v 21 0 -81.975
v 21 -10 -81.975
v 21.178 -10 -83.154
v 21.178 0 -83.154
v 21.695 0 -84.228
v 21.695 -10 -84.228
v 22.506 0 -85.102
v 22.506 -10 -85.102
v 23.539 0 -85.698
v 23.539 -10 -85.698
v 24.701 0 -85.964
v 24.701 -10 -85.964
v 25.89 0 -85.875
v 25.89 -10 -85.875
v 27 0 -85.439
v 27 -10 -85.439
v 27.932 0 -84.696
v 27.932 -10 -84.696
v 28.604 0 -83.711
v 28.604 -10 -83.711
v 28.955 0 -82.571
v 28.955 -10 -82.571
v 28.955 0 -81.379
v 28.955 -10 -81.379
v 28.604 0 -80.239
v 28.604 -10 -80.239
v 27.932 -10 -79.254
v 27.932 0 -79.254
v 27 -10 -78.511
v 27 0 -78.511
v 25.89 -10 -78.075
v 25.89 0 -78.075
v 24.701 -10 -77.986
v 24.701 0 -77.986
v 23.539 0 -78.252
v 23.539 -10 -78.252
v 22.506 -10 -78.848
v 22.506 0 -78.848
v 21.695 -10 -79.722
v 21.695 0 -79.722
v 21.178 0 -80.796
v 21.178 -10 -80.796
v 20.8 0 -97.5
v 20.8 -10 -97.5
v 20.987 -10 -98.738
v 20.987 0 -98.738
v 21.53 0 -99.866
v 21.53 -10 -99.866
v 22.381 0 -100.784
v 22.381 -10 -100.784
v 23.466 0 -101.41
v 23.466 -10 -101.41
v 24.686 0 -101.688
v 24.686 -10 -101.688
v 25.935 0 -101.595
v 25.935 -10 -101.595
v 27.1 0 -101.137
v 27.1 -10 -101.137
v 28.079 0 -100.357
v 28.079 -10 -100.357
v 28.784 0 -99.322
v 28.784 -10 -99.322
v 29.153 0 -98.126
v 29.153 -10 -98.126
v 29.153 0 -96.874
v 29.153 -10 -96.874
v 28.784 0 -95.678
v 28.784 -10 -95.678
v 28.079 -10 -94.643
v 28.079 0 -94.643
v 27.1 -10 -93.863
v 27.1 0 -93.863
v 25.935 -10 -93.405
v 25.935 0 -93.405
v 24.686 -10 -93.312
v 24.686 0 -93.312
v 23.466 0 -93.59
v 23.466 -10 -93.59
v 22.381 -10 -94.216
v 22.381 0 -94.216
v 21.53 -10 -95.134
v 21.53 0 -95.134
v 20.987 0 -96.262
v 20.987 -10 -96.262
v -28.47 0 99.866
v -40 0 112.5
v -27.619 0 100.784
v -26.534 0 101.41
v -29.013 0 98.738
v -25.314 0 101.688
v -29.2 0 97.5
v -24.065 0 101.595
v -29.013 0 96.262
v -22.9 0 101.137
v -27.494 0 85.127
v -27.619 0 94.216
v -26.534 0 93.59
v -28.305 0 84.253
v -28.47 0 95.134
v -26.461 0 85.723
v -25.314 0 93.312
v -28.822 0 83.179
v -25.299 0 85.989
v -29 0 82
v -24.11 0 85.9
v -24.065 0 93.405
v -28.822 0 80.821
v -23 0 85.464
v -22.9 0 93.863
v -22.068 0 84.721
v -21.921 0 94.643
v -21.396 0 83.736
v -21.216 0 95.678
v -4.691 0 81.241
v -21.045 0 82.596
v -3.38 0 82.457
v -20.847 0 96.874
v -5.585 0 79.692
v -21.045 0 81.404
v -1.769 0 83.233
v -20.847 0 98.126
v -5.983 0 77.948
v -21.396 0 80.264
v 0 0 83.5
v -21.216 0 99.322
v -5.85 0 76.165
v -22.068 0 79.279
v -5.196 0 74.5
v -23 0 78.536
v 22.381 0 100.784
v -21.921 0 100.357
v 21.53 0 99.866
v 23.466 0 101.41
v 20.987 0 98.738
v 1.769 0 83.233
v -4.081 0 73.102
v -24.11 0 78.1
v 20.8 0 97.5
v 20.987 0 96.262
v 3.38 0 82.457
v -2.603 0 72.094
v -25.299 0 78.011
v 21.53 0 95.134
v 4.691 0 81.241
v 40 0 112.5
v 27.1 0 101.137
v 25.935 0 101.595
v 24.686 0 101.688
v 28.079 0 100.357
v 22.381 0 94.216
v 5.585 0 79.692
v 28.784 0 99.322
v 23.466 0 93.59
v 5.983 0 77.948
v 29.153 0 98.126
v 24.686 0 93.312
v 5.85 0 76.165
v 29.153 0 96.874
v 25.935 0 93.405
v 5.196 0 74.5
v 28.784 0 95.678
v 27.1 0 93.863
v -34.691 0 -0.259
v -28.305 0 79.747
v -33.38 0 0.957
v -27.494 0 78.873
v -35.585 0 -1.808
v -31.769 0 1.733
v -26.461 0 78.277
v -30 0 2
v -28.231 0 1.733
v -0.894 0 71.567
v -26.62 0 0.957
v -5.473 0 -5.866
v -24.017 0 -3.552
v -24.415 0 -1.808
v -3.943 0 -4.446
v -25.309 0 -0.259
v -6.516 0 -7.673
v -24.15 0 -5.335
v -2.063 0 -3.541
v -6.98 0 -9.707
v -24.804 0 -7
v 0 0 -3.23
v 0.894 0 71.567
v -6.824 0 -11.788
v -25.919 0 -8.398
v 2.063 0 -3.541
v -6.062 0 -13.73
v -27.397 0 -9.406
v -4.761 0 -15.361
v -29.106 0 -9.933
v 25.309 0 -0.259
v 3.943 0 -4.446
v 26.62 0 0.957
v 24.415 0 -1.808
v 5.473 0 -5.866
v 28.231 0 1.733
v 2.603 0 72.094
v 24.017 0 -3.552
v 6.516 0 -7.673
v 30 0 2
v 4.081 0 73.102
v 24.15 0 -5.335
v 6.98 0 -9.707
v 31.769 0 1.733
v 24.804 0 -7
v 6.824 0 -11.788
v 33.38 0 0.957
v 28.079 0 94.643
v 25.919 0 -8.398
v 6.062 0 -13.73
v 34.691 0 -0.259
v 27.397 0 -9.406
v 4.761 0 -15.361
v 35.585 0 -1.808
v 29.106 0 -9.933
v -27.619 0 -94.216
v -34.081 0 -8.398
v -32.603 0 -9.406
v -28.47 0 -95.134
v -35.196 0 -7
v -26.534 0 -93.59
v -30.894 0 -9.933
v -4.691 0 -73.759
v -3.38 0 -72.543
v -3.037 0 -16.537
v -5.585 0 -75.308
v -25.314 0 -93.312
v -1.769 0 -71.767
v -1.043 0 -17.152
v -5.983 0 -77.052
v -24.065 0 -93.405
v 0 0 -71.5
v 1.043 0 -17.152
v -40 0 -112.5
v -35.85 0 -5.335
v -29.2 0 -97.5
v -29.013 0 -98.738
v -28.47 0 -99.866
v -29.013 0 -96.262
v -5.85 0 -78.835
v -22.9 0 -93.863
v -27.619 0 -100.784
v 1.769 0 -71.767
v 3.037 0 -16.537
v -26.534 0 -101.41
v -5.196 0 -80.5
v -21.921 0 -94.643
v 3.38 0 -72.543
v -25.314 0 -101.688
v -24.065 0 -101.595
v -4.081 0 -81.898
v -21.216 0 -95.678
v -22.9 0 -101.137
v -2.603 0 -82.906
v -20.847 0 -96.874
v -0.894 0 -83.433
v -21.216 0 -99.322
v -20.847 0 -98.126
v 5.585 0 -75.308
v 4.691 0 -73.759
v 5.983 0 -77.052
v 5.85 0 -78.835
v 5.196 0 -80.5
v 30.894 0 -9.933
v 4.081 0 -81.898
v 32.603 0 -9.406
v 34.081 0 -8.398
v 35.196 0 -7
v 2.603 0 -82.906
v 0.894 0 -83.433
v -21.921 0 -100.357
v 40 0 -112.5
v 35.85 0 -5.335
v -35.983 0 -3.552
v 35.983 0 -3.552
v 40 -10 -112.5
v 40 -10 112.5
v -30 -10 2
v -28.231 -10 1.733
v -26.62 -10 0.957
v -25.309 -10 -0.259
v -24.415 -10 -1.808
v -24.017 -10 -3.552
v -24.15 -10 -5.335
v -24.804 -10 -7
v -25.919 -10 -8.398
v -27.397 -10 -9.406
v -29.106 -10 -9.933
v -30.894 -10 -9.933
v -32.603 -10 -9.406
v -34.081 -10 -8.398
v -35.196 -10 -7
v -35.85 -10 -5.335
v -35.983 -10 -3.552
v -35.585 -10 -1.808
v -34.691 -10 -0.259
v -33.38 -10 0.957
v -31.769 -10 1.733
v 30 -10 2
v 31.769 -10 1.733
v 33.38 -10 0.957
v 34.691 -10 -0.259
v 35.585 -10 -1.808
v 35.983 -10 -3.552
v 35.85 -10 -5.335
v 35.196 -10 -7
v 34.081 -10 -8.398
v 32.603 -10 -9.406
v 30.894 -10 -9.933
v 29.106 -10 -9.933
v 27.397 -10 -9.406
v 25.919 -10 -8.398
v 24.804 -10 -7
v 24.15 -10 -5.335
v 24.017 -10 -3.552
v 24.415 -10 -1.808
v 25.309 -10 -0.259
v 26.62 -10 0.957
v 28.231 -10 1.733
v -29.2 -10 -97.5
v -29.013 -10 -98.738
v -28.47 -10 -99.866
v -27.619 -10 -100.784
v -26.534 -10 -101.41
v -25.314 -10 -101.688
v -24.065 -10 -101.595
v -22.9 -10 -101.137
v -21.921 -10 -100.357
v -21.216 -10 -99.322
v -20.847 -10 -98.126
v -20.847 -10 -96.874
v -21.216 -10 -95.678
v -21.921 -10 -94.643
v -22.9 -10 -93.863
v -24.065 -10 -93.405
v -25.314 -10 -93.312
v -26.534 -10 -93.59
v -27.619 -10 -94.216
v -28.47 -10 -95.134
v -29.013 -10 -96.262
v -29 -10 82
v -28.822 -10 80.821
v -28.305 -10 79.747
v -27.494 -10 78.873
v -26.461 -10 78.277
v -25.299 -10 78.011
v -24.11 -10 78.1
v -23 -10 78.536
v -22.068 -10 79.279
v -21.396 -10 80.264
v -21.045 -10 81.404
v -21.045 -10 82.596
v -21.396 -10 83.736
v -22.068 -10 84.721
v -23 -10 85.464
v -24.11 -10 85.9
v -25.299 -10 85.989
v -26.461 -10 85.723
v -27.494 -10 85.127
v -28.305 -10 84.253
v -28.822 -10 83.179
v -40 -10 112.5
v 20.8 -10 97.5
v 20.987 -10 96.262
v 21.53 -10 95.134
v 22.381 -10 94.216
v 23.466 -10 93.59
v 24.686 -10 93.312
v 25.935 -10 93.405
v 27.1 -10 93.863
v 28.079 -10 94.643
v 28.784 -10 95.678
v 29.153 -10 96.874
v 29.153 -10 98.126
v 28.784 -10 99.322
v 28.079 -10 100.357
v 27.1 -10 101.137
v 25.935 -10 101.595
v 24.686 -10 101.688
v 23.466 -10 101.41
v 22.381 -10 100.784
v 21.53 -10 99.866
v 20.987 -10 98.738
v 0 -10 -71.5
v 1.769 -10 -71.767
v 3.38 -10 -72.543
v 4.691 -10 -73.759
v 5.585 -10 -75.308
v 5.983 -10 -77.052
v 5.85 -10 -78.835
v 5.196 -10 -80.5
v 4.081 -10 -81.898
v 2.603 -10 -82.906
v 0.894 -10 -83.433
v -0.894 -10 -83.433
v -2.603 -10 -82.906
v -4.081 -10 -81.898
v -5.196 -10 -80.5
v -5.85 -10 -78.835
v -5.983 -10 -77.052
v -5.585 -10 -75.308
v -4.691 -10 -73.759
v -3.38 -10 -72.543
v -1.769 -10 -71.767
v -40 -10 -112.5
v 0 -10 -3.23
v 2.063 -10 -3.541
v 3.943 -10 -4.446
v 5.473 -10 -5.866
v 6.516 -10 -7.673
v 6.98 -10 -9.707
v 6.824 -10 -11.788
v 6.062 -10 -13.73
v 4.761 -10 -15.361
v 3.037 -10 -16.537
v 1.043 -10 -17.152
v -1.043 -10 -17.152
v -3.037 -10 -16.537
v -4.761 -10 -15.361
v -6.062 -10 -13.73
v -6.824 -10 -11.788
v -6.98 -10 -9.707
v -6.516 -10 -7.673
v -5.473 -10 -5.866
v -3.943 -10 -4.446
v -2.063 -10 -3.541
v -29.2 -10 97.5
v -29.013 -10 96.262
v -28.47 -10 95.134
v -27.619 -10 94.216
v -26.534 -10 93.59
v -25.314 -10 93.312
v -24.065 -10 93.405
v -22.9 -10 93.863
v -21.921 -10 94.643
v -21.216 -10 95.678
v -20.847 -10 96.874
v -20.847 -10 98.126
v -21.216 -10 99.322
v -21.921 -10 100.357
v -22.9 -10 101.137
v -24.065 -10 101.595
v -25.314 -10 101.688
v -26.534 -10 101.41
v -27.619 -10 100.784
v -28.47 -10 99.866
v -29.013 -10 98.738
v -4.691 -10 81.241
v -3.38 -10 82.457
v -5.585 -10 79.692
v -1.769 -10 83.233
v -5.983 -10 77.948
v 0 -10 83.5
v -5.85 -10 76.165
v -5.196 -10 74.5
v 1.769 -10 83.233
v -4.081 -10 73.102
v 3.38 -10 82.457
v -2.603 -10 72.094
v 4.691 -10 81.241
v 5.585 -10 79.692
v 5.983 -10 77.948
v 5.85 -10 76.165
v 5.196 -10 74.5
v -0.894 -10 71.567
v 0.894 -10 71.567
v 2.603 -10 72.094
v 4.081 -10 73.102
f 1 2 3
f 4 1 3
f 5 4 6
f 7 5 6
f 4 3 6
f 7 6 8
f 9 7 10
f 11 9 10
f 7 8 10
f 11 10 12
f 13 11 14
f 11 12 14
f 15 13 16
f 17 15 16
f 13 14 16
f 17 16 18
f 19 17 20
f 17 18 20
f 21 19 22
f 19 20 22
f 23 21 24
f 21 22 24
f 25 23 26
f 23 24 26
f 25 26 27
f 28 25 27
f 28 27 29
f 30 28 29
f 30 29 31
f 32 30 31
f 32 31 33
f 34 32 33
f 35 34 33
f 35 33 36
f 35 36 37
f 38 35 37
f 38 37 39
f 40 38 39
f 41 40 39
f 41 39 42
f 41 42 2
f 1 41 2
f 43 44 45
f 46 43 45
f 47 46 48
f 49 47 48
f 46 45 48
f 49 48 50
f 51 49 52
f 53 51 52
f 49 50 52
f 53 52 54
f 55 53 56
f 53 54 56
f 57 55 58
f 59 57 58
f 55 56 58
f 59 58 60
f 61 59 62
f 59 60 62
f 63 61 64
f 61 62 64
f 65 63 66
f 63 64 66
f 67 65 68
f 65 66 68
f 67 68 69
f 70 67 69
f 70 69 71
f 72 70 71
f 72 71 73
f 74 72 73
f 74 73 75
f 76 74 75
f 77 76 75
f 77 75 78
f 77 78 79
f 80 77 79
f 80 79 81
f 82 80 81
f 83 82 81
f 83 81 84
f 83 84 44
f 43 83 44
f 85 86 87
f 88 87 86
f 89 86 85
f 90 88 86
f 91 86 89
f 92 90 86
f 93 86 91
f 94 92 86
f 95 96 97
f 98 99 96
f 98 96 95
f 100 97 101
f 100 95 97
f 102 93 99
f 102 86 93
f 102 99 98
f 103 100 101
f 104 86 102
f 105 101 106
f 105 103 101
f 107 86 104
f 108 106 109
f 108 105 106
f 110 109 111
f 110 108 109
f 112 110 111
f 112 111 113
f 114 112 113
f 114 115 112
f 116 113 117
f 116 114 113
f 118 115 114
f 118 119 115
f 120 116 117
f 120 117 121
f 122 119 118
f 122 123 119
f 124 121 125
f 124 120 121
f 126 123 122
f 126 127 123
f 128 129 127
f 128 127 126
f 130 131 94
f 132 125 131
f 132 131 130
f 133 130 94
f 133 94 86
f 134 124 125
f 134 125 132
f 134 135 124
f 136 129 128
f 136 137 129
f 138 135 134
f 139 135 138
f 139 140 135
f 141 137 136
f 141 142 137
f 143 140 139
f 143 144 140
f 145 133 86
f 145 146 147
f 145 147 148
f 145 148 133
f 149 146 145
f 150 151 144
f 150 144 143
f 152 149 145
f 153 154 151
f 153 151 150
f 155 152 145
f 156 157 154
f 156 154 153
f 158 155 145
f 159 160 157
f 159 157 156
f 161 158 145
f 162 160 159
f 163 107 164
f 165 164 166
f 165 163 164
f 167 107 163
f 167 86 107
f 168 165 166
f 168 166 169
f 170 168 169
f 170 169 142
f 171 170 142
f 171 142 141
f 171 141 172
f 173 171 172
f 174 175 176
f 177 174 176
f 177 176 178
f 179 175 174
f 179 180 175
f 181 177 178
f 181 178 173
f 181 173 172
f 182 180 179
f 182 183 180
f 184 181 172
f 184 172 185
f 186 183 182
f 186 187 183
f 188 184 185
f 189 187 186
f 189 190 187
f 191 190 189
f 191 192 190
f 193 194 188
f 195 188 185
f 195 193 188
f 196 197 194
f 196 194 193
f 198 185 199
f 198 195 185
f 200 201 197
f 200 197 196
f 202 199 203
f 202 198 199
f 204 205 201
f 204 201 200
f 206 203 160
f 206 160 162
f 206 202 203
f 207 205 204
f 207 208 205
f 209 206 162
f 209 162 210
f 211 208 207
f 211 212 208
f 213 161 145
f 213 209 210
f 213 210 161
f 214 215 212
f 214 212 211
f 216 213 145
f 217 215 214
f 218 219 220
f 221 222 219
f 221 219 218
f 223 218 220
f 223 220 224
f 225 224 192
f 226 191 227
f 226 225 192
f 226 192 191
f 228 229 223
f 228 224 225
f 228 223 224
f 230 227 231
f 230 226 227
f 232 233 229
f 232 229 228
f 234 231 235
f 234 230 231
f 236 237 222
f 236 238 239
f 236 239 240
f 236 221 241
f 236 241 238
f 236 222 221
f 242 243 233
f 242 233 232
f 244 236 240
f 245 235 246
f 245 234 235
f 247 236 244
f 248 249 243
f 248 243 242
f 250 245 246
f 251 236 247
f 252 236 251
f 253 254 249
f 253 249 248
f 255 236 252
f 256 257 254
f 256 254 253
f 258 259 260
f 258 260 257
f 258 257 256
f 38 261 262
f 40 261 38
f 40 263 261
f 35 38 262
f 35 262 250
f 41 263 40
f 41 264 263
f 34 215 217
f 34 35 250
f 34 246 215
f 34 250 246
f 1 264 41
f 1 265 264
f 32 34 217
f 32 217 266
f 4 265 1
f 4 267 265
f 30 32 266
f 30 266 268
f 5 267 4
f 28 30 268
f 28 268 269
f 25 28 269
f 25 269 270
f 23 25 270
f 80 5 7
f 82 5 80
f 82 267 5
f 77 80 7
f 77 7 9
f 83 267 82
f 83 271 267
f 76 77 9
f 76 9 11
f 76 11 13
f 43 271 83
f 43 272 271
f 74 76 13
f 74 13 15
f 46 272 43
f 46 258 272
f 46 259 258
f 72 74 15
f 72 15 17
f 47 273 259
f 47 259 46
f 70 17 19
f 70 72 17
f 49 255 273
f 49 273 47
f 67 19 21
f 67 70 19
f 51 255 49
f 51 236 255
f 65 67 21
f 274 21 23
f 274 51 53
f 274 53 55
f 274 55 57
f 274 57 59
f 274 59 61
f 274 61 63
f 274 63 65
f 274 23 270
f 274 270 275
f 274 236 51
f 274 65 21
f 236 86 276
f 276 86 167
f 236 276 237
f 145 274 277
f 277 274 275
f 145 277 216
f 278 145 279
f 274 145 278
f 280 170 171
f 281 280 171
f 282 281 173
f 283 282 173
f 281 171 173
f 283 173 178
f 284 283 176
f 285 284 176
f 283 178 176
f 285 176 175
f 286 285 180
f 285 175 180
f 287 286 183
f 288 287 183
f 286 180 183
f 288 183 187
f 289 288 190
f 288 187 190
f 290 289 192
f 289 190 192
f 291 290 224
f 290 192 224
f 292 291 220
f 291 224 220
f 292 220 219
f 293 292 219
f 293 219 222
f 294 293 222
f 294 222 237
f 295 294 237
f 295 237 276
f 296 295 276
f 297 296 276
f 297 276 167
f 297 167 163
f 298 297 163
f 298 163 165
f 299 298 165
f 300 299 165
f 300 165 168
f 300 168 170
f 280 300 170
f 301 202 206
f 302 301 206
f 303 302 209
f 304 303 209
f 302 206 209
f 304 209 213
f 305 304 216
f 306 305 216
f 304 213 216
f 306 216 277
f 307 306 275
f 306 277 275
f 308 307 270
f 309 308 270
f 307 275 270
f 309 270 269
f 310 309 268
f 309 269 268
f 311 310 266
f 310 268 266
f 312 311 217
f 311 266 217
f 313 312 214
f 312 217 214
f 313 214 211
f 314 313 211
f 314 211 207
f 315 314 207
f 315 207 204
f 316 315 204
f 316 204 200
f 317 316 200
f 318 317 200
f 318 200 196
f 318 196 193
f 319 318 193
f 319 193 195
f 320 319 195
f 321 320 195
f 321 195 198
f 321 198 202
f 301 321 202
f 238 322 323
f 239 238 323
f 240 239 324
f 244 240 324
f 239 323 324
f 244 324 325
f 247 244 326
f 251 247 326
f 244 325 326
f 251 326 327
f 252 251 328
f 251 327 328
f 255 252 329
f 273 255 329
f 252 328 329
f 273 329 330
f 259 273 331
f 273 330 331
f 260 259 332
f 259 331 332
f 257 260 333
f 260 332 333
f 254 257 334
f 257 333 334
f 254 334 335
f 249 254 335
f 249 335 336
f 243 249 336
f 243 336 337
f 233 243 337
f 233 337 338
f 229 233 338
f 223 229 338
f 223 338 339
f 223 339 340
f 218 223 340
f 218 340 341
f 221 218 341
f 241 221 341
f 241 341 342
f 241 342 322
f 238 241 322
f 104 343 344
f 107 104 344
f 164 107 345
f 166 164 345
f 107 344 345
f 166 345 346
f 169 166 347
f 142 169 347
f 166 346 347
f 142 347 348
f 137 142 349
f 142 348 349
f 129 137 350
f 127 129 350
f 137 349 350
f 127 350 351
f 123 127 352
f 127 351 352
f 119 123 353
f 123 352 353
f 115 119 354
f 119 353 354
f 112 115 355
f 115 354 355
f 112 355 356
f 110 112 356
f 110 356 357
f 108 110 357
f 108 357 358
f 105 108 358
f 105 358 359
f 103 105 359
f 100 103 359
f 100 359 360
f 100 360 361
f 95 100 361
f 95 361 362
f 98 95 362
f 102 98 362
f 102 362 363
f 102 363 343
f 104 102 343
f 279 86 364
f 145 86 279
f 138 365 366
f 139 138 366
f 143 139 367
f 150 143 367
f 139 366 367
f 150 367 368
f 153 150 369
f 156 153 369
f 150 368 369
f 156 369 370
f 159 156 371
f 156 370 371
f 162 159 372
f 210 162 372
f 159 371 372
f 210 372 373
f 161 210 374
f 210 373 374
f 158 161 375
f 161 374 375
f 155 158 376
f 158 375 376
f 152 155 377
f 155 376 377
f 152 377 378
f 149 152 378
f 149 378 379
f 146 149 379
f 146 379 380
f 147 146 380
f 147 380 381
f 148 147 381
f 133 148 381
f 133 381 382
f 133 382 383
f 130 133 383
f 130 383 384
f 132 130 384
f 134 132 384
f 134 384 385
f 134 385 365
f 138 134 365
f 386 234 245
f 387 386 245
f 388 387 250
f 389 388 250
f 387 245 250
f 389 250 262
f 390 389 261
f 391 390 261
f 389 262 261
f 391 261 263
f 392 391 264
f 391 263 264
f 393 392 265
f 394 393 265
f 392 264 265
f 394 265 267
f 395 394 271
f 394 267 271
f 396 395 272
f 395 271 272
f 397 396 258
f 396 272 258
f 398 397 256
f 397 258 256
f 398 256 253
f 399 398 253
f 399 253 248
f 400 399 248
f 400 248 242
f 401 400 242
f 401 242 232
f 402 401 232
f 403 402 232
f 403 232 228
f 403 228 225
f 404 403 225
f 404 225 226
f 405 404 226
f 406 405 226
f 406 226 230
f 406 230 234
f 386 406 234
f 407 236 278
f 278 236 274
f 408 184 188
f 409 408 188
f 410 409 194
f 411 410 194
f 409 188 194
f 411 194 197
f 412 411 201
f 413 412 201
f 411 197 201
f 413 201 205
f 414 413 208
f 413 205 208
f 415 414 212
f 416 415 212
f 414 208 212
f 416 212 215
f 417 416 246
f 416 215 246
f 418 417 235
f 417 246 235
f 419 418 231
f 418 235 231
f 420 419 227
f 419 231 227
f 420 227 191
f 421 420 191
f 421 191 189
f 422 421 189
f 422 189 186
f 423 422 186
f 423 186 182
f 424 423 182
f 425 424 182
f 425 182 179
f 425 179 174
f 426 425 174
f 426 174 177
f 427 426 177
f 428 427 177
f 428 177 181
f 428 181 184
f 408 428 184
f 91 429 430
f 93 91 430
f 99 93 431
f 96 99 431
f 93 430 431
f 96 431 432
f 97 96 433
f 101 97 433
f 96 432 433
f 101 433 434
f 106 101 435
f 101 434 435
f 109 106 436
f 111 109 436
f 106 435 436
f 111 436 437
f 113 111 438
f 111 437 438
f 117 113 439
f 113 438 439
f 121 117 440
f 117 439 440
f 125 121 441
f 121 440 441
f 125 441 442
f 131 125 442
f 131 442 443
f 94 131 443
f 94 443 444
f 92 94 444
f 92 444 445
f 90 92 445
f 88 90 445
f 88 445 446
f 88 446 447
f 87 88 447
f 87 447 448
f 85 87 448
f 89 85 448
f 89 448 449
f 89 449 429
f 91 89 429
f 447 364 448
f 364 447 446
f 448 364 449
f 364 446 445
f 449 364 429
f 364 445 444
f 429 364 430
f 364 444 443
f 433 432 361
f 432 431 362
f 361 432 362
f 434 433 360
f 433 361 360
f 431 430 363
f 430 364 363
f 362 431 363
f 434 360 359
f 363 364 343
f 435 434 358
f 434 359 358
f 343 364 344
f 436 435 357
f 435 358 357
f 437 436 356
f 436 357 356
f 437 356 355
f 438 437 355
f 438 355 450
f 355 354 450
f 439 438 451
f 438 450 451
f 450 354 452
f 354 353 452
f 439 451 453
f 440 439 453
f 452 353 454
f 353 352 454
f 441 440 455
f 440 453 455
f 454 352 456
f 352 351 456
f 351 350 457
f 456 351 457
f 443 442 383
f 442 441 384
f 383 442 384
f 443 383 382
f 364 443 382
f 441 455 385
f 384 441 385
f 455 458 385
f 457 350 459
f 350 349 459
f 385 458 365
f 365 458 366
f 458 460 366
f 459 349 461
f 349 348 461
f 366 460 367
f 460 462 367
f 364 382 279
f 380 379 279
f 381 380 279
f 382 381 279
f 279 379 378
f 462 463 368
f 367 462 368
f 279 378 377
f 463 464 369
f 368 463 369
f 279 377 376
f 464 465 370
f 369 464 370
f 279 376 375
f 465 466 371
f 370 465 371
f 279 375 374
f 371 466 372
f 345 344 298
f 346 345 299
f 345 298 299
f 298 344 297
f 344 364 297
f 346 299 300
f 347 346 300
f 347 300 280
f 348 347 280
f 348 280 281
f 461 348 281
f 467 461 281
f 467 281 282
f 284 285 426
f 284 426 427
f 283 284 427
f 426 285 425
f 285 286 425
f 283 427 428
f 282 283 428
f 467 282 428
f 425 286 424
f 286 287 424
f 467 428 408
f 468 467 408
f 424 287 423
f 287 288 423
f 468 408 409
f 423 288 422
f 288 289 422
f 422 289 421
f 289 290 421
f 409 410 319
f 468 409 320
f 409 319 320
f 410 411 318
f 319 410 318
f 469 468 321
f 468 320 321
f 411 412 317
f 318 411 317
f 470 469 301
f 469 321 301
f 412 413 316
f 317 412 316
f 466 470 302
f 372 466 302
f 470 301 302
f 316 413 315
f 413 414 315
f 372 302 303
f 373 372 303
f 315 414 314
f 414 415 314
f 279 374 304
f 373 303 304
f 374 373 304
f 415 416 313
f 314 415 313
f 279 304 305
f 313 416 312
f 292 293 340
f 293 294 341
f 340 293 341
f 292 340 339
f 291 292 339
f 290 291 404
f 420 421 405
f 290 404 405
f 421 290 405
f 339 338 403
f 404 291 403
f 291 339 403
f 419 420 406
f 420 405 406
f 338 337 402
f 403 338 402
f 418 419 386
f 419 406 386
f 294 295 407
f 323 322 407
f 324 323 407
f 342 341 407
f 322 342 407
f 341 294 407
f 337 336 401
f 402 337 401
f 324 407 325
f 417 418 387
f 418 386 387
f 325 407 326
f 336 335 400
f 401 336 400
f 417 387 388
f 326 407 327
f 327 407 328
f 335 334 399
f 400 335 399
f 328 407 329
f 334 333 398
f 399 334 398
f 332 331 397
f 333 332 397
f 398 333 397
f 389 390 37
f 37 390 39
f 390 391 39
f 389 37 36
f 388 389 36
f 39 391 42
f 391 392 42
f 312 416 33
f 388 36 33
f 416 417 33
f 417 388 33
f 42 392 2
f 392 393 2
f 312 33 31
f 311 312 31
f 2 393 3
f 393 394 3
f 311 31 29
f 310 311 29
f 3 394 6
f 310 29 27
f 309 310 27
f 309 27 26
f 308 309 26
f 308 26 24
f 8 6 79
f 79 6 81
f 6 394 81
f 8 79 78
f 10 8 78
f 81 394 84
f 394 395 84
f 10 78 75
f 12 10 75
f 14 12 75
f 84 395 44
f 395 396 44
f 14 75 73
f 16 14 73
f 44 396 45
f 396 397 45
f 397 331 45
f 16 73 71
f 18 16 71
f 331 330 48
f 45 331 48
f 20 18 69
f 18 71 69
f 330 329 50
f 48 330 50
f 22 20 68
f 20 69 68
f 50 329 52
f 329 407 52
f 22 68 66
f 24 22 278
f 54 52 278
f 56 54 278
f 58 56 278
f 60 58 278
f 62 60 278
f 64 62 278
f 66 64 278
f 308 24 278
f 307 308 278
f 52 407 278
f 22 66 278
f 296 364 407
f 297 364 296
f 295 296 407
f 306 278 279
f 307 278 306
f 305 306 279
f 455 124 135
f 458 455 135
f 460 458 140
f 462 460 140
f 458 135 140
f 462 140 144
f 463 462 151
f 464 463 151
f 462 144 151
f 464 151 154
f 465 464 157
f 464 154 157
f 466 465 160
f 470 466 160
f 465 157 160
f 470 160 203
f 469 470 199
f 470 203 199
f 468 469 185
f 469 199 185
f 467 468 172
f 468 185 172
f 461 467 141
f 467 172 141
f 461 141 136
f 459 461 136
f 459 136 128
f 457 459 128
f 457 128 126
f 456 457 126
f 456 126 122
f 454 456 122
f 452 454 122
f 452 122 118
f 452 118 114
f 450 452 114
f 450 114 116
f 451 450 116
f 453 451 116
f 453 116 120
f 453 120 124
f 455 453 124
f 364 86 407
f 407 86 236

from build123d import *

# Parameters (mm, degrees)
SKETCH1_W             = 80
SKETCH1_H             = 225
BOSS_EXTRUDE1_DEPTH   = 10
CUT_EXTRUDE1_REACH    = 121.818
SKETCH2_R             = 6
M8_CLEARANCE_HOLE1_D  = 8.4
F_8_0MM_DOWEL_HOLE1_D = 8
CUT_EXTRUDE3_REACH    = 121.818
SKETCH10_R            = 7


with BuildPart() as part:
    # Sketch1 → Boss-Extrude1 (new body)
    with BuildSketch(Plane(origin=(0, 0, 0), x_dir=(1, 0, 0), z_dir=(0, 1, 0))):
        Rectangle(SKETCH1_W, SKETCH1_H)
    extrude(amount=-BOSS_EXTRUDE1_DEPTH)

    # Sketch2 → Cut-Extrude1 (cut, up to next)
    with BuildSketch(Plane(origin=(0, 0, 0), x_dir=(1, 0, 0), z_dir=(0, 1, 0)), mode=Mode.PRIVATE) as cut_extrude1_sk1:
        with Locations(Location((0, 77.5, 0), (0, 0, 270))):
            Circle(SKETCH2_R)
    cut_extrude1_tool1 = extrude(cut_extrude1_sk1.sketch, amount=-CUT_EXTRUDE1_REACH, mode=Mode.PRIVATE) & part.part
    # Sketch2 → Cut-Extrude1 (cut, up to next)
    with BuildSketch(Plane(origin=(0, 0, 0), x_dir=(1, 0, 0), z_dir=(0, 1, 0)), mode=Mode.PRIVATE) as cut_extrude1_sk2:
        with Locations(Location((30, 4, 0), (0, 0, 270))):
            Circle(SKETCH2_R)
    cut_extrude1_tool2 = extrude(cut_extrude1_sk2.sketch, amount=-CUT_EXTRUDE1_REACH, mode=Mode.PRIVATE) & part.part
    # Sketch2 → Cut-Extrude1 (cut, up to next)
    with BuildSketch(Plane(origin=(0, 0, 0), x_dir=(1, 0, 0), z_dir=(0, 1, 0)), mode=Mode.PRIVATE) as cut_extrude1_sk3:
        with Locations(Location((-30, 4, 0), (0, 0, 270))):
            Circle(SKETCH2_R)
    cut_extrude1_tool3 = extrude(cut_extrude1_sk3.sketch, amount=-CUT_EXTRUDE1_REACH, mode=Mode.PRIVATE) & part.part
    # Sketch2 → Cut-Extrude1 (cut, up to next)
    with BuildSketch(Plane(origin=(0, 0, 0), x_dir=(1, 0, 0), z_dir=(0, 1, 0)), mode=Mode.PRIVATE) as cut_extrude1_sk4:
        with Locations(Location((0, -77.5, 0), (0, 0, 270))):
            Circle(SKETCH2_R)
    cut_extrude1_tool4 = extrude(cut_extrude1_sk4.sketch, amount=-CUT_EXTRUDE1_REACH, mode=Mode.PRIVATE) & part.part
    add(cut_extrude1_tool1.solids().sort_by_distance((0, 0, -77.5))[0], mode=Mode.SUBTRACT)
    add(cut_extrude1_tool2.solids().sort_by_distance((30, 0, -4))[0], mode=Mode.SUBTRACT)
    add(cut_extrude1_tool3.solids().sort_by_distance((-30, 0, -4))[0], mode=Mode.SUBTRACT)
    add(cut_extrude1_tool4.solids().sort_by_distance((0, 0, 77.5))[0], mode=Mode.SUBTRACT)

    # M8 Clearance Hole1 (through all)
    with Locations(Plane(origin=(0, 0, 0), x_dir=(1, 0, 0), z_dir=(0, 1, 0))):
        with Locations((-25, 97.5), (25, 97.5), (25, -97.5), (-25, -97.5)):
            Hole(M8_CLEARANCE_HOLE1_D / 2)

    # Ø8.0mm Dowel Hole1 (through all)
    with Locations(Plane(origin=(0, 0, 0), x_dir=(1, 0, 0), z_dir=(0, 1, 0))):
        with Locations((25, 81.975), (-25, -82)):
            Hole(F_8_0MM_DOWEL_HOLE1_D / 2)

    # Sketch10 → Cut-Extrude3 (cut, up to next)
    with BuildSketch(Plane(origin=(0, 0, 0), x_dir=(1, 0, 0), z_dir=(0, 1, 0)), mode=Mode.PRIVATE) as cut_extrude3_sk1:
        with Locations(Location((0, 10.23, 0), (0, 0, 270))):
            Circle(SKETCH10_R)
    cut_extrude3_tool1 = extrude(cut_extrude3_sk1.sketch, amount=-CUT_EXTRUDE3_REACH, mode=Mode.PRIVATE) & part.part
    add(cut_extrude3_tool1.solids().sort_by_distance((0, 0, -10.23))[0], mode=Mode.SUBTRACT)


solid = part.part
